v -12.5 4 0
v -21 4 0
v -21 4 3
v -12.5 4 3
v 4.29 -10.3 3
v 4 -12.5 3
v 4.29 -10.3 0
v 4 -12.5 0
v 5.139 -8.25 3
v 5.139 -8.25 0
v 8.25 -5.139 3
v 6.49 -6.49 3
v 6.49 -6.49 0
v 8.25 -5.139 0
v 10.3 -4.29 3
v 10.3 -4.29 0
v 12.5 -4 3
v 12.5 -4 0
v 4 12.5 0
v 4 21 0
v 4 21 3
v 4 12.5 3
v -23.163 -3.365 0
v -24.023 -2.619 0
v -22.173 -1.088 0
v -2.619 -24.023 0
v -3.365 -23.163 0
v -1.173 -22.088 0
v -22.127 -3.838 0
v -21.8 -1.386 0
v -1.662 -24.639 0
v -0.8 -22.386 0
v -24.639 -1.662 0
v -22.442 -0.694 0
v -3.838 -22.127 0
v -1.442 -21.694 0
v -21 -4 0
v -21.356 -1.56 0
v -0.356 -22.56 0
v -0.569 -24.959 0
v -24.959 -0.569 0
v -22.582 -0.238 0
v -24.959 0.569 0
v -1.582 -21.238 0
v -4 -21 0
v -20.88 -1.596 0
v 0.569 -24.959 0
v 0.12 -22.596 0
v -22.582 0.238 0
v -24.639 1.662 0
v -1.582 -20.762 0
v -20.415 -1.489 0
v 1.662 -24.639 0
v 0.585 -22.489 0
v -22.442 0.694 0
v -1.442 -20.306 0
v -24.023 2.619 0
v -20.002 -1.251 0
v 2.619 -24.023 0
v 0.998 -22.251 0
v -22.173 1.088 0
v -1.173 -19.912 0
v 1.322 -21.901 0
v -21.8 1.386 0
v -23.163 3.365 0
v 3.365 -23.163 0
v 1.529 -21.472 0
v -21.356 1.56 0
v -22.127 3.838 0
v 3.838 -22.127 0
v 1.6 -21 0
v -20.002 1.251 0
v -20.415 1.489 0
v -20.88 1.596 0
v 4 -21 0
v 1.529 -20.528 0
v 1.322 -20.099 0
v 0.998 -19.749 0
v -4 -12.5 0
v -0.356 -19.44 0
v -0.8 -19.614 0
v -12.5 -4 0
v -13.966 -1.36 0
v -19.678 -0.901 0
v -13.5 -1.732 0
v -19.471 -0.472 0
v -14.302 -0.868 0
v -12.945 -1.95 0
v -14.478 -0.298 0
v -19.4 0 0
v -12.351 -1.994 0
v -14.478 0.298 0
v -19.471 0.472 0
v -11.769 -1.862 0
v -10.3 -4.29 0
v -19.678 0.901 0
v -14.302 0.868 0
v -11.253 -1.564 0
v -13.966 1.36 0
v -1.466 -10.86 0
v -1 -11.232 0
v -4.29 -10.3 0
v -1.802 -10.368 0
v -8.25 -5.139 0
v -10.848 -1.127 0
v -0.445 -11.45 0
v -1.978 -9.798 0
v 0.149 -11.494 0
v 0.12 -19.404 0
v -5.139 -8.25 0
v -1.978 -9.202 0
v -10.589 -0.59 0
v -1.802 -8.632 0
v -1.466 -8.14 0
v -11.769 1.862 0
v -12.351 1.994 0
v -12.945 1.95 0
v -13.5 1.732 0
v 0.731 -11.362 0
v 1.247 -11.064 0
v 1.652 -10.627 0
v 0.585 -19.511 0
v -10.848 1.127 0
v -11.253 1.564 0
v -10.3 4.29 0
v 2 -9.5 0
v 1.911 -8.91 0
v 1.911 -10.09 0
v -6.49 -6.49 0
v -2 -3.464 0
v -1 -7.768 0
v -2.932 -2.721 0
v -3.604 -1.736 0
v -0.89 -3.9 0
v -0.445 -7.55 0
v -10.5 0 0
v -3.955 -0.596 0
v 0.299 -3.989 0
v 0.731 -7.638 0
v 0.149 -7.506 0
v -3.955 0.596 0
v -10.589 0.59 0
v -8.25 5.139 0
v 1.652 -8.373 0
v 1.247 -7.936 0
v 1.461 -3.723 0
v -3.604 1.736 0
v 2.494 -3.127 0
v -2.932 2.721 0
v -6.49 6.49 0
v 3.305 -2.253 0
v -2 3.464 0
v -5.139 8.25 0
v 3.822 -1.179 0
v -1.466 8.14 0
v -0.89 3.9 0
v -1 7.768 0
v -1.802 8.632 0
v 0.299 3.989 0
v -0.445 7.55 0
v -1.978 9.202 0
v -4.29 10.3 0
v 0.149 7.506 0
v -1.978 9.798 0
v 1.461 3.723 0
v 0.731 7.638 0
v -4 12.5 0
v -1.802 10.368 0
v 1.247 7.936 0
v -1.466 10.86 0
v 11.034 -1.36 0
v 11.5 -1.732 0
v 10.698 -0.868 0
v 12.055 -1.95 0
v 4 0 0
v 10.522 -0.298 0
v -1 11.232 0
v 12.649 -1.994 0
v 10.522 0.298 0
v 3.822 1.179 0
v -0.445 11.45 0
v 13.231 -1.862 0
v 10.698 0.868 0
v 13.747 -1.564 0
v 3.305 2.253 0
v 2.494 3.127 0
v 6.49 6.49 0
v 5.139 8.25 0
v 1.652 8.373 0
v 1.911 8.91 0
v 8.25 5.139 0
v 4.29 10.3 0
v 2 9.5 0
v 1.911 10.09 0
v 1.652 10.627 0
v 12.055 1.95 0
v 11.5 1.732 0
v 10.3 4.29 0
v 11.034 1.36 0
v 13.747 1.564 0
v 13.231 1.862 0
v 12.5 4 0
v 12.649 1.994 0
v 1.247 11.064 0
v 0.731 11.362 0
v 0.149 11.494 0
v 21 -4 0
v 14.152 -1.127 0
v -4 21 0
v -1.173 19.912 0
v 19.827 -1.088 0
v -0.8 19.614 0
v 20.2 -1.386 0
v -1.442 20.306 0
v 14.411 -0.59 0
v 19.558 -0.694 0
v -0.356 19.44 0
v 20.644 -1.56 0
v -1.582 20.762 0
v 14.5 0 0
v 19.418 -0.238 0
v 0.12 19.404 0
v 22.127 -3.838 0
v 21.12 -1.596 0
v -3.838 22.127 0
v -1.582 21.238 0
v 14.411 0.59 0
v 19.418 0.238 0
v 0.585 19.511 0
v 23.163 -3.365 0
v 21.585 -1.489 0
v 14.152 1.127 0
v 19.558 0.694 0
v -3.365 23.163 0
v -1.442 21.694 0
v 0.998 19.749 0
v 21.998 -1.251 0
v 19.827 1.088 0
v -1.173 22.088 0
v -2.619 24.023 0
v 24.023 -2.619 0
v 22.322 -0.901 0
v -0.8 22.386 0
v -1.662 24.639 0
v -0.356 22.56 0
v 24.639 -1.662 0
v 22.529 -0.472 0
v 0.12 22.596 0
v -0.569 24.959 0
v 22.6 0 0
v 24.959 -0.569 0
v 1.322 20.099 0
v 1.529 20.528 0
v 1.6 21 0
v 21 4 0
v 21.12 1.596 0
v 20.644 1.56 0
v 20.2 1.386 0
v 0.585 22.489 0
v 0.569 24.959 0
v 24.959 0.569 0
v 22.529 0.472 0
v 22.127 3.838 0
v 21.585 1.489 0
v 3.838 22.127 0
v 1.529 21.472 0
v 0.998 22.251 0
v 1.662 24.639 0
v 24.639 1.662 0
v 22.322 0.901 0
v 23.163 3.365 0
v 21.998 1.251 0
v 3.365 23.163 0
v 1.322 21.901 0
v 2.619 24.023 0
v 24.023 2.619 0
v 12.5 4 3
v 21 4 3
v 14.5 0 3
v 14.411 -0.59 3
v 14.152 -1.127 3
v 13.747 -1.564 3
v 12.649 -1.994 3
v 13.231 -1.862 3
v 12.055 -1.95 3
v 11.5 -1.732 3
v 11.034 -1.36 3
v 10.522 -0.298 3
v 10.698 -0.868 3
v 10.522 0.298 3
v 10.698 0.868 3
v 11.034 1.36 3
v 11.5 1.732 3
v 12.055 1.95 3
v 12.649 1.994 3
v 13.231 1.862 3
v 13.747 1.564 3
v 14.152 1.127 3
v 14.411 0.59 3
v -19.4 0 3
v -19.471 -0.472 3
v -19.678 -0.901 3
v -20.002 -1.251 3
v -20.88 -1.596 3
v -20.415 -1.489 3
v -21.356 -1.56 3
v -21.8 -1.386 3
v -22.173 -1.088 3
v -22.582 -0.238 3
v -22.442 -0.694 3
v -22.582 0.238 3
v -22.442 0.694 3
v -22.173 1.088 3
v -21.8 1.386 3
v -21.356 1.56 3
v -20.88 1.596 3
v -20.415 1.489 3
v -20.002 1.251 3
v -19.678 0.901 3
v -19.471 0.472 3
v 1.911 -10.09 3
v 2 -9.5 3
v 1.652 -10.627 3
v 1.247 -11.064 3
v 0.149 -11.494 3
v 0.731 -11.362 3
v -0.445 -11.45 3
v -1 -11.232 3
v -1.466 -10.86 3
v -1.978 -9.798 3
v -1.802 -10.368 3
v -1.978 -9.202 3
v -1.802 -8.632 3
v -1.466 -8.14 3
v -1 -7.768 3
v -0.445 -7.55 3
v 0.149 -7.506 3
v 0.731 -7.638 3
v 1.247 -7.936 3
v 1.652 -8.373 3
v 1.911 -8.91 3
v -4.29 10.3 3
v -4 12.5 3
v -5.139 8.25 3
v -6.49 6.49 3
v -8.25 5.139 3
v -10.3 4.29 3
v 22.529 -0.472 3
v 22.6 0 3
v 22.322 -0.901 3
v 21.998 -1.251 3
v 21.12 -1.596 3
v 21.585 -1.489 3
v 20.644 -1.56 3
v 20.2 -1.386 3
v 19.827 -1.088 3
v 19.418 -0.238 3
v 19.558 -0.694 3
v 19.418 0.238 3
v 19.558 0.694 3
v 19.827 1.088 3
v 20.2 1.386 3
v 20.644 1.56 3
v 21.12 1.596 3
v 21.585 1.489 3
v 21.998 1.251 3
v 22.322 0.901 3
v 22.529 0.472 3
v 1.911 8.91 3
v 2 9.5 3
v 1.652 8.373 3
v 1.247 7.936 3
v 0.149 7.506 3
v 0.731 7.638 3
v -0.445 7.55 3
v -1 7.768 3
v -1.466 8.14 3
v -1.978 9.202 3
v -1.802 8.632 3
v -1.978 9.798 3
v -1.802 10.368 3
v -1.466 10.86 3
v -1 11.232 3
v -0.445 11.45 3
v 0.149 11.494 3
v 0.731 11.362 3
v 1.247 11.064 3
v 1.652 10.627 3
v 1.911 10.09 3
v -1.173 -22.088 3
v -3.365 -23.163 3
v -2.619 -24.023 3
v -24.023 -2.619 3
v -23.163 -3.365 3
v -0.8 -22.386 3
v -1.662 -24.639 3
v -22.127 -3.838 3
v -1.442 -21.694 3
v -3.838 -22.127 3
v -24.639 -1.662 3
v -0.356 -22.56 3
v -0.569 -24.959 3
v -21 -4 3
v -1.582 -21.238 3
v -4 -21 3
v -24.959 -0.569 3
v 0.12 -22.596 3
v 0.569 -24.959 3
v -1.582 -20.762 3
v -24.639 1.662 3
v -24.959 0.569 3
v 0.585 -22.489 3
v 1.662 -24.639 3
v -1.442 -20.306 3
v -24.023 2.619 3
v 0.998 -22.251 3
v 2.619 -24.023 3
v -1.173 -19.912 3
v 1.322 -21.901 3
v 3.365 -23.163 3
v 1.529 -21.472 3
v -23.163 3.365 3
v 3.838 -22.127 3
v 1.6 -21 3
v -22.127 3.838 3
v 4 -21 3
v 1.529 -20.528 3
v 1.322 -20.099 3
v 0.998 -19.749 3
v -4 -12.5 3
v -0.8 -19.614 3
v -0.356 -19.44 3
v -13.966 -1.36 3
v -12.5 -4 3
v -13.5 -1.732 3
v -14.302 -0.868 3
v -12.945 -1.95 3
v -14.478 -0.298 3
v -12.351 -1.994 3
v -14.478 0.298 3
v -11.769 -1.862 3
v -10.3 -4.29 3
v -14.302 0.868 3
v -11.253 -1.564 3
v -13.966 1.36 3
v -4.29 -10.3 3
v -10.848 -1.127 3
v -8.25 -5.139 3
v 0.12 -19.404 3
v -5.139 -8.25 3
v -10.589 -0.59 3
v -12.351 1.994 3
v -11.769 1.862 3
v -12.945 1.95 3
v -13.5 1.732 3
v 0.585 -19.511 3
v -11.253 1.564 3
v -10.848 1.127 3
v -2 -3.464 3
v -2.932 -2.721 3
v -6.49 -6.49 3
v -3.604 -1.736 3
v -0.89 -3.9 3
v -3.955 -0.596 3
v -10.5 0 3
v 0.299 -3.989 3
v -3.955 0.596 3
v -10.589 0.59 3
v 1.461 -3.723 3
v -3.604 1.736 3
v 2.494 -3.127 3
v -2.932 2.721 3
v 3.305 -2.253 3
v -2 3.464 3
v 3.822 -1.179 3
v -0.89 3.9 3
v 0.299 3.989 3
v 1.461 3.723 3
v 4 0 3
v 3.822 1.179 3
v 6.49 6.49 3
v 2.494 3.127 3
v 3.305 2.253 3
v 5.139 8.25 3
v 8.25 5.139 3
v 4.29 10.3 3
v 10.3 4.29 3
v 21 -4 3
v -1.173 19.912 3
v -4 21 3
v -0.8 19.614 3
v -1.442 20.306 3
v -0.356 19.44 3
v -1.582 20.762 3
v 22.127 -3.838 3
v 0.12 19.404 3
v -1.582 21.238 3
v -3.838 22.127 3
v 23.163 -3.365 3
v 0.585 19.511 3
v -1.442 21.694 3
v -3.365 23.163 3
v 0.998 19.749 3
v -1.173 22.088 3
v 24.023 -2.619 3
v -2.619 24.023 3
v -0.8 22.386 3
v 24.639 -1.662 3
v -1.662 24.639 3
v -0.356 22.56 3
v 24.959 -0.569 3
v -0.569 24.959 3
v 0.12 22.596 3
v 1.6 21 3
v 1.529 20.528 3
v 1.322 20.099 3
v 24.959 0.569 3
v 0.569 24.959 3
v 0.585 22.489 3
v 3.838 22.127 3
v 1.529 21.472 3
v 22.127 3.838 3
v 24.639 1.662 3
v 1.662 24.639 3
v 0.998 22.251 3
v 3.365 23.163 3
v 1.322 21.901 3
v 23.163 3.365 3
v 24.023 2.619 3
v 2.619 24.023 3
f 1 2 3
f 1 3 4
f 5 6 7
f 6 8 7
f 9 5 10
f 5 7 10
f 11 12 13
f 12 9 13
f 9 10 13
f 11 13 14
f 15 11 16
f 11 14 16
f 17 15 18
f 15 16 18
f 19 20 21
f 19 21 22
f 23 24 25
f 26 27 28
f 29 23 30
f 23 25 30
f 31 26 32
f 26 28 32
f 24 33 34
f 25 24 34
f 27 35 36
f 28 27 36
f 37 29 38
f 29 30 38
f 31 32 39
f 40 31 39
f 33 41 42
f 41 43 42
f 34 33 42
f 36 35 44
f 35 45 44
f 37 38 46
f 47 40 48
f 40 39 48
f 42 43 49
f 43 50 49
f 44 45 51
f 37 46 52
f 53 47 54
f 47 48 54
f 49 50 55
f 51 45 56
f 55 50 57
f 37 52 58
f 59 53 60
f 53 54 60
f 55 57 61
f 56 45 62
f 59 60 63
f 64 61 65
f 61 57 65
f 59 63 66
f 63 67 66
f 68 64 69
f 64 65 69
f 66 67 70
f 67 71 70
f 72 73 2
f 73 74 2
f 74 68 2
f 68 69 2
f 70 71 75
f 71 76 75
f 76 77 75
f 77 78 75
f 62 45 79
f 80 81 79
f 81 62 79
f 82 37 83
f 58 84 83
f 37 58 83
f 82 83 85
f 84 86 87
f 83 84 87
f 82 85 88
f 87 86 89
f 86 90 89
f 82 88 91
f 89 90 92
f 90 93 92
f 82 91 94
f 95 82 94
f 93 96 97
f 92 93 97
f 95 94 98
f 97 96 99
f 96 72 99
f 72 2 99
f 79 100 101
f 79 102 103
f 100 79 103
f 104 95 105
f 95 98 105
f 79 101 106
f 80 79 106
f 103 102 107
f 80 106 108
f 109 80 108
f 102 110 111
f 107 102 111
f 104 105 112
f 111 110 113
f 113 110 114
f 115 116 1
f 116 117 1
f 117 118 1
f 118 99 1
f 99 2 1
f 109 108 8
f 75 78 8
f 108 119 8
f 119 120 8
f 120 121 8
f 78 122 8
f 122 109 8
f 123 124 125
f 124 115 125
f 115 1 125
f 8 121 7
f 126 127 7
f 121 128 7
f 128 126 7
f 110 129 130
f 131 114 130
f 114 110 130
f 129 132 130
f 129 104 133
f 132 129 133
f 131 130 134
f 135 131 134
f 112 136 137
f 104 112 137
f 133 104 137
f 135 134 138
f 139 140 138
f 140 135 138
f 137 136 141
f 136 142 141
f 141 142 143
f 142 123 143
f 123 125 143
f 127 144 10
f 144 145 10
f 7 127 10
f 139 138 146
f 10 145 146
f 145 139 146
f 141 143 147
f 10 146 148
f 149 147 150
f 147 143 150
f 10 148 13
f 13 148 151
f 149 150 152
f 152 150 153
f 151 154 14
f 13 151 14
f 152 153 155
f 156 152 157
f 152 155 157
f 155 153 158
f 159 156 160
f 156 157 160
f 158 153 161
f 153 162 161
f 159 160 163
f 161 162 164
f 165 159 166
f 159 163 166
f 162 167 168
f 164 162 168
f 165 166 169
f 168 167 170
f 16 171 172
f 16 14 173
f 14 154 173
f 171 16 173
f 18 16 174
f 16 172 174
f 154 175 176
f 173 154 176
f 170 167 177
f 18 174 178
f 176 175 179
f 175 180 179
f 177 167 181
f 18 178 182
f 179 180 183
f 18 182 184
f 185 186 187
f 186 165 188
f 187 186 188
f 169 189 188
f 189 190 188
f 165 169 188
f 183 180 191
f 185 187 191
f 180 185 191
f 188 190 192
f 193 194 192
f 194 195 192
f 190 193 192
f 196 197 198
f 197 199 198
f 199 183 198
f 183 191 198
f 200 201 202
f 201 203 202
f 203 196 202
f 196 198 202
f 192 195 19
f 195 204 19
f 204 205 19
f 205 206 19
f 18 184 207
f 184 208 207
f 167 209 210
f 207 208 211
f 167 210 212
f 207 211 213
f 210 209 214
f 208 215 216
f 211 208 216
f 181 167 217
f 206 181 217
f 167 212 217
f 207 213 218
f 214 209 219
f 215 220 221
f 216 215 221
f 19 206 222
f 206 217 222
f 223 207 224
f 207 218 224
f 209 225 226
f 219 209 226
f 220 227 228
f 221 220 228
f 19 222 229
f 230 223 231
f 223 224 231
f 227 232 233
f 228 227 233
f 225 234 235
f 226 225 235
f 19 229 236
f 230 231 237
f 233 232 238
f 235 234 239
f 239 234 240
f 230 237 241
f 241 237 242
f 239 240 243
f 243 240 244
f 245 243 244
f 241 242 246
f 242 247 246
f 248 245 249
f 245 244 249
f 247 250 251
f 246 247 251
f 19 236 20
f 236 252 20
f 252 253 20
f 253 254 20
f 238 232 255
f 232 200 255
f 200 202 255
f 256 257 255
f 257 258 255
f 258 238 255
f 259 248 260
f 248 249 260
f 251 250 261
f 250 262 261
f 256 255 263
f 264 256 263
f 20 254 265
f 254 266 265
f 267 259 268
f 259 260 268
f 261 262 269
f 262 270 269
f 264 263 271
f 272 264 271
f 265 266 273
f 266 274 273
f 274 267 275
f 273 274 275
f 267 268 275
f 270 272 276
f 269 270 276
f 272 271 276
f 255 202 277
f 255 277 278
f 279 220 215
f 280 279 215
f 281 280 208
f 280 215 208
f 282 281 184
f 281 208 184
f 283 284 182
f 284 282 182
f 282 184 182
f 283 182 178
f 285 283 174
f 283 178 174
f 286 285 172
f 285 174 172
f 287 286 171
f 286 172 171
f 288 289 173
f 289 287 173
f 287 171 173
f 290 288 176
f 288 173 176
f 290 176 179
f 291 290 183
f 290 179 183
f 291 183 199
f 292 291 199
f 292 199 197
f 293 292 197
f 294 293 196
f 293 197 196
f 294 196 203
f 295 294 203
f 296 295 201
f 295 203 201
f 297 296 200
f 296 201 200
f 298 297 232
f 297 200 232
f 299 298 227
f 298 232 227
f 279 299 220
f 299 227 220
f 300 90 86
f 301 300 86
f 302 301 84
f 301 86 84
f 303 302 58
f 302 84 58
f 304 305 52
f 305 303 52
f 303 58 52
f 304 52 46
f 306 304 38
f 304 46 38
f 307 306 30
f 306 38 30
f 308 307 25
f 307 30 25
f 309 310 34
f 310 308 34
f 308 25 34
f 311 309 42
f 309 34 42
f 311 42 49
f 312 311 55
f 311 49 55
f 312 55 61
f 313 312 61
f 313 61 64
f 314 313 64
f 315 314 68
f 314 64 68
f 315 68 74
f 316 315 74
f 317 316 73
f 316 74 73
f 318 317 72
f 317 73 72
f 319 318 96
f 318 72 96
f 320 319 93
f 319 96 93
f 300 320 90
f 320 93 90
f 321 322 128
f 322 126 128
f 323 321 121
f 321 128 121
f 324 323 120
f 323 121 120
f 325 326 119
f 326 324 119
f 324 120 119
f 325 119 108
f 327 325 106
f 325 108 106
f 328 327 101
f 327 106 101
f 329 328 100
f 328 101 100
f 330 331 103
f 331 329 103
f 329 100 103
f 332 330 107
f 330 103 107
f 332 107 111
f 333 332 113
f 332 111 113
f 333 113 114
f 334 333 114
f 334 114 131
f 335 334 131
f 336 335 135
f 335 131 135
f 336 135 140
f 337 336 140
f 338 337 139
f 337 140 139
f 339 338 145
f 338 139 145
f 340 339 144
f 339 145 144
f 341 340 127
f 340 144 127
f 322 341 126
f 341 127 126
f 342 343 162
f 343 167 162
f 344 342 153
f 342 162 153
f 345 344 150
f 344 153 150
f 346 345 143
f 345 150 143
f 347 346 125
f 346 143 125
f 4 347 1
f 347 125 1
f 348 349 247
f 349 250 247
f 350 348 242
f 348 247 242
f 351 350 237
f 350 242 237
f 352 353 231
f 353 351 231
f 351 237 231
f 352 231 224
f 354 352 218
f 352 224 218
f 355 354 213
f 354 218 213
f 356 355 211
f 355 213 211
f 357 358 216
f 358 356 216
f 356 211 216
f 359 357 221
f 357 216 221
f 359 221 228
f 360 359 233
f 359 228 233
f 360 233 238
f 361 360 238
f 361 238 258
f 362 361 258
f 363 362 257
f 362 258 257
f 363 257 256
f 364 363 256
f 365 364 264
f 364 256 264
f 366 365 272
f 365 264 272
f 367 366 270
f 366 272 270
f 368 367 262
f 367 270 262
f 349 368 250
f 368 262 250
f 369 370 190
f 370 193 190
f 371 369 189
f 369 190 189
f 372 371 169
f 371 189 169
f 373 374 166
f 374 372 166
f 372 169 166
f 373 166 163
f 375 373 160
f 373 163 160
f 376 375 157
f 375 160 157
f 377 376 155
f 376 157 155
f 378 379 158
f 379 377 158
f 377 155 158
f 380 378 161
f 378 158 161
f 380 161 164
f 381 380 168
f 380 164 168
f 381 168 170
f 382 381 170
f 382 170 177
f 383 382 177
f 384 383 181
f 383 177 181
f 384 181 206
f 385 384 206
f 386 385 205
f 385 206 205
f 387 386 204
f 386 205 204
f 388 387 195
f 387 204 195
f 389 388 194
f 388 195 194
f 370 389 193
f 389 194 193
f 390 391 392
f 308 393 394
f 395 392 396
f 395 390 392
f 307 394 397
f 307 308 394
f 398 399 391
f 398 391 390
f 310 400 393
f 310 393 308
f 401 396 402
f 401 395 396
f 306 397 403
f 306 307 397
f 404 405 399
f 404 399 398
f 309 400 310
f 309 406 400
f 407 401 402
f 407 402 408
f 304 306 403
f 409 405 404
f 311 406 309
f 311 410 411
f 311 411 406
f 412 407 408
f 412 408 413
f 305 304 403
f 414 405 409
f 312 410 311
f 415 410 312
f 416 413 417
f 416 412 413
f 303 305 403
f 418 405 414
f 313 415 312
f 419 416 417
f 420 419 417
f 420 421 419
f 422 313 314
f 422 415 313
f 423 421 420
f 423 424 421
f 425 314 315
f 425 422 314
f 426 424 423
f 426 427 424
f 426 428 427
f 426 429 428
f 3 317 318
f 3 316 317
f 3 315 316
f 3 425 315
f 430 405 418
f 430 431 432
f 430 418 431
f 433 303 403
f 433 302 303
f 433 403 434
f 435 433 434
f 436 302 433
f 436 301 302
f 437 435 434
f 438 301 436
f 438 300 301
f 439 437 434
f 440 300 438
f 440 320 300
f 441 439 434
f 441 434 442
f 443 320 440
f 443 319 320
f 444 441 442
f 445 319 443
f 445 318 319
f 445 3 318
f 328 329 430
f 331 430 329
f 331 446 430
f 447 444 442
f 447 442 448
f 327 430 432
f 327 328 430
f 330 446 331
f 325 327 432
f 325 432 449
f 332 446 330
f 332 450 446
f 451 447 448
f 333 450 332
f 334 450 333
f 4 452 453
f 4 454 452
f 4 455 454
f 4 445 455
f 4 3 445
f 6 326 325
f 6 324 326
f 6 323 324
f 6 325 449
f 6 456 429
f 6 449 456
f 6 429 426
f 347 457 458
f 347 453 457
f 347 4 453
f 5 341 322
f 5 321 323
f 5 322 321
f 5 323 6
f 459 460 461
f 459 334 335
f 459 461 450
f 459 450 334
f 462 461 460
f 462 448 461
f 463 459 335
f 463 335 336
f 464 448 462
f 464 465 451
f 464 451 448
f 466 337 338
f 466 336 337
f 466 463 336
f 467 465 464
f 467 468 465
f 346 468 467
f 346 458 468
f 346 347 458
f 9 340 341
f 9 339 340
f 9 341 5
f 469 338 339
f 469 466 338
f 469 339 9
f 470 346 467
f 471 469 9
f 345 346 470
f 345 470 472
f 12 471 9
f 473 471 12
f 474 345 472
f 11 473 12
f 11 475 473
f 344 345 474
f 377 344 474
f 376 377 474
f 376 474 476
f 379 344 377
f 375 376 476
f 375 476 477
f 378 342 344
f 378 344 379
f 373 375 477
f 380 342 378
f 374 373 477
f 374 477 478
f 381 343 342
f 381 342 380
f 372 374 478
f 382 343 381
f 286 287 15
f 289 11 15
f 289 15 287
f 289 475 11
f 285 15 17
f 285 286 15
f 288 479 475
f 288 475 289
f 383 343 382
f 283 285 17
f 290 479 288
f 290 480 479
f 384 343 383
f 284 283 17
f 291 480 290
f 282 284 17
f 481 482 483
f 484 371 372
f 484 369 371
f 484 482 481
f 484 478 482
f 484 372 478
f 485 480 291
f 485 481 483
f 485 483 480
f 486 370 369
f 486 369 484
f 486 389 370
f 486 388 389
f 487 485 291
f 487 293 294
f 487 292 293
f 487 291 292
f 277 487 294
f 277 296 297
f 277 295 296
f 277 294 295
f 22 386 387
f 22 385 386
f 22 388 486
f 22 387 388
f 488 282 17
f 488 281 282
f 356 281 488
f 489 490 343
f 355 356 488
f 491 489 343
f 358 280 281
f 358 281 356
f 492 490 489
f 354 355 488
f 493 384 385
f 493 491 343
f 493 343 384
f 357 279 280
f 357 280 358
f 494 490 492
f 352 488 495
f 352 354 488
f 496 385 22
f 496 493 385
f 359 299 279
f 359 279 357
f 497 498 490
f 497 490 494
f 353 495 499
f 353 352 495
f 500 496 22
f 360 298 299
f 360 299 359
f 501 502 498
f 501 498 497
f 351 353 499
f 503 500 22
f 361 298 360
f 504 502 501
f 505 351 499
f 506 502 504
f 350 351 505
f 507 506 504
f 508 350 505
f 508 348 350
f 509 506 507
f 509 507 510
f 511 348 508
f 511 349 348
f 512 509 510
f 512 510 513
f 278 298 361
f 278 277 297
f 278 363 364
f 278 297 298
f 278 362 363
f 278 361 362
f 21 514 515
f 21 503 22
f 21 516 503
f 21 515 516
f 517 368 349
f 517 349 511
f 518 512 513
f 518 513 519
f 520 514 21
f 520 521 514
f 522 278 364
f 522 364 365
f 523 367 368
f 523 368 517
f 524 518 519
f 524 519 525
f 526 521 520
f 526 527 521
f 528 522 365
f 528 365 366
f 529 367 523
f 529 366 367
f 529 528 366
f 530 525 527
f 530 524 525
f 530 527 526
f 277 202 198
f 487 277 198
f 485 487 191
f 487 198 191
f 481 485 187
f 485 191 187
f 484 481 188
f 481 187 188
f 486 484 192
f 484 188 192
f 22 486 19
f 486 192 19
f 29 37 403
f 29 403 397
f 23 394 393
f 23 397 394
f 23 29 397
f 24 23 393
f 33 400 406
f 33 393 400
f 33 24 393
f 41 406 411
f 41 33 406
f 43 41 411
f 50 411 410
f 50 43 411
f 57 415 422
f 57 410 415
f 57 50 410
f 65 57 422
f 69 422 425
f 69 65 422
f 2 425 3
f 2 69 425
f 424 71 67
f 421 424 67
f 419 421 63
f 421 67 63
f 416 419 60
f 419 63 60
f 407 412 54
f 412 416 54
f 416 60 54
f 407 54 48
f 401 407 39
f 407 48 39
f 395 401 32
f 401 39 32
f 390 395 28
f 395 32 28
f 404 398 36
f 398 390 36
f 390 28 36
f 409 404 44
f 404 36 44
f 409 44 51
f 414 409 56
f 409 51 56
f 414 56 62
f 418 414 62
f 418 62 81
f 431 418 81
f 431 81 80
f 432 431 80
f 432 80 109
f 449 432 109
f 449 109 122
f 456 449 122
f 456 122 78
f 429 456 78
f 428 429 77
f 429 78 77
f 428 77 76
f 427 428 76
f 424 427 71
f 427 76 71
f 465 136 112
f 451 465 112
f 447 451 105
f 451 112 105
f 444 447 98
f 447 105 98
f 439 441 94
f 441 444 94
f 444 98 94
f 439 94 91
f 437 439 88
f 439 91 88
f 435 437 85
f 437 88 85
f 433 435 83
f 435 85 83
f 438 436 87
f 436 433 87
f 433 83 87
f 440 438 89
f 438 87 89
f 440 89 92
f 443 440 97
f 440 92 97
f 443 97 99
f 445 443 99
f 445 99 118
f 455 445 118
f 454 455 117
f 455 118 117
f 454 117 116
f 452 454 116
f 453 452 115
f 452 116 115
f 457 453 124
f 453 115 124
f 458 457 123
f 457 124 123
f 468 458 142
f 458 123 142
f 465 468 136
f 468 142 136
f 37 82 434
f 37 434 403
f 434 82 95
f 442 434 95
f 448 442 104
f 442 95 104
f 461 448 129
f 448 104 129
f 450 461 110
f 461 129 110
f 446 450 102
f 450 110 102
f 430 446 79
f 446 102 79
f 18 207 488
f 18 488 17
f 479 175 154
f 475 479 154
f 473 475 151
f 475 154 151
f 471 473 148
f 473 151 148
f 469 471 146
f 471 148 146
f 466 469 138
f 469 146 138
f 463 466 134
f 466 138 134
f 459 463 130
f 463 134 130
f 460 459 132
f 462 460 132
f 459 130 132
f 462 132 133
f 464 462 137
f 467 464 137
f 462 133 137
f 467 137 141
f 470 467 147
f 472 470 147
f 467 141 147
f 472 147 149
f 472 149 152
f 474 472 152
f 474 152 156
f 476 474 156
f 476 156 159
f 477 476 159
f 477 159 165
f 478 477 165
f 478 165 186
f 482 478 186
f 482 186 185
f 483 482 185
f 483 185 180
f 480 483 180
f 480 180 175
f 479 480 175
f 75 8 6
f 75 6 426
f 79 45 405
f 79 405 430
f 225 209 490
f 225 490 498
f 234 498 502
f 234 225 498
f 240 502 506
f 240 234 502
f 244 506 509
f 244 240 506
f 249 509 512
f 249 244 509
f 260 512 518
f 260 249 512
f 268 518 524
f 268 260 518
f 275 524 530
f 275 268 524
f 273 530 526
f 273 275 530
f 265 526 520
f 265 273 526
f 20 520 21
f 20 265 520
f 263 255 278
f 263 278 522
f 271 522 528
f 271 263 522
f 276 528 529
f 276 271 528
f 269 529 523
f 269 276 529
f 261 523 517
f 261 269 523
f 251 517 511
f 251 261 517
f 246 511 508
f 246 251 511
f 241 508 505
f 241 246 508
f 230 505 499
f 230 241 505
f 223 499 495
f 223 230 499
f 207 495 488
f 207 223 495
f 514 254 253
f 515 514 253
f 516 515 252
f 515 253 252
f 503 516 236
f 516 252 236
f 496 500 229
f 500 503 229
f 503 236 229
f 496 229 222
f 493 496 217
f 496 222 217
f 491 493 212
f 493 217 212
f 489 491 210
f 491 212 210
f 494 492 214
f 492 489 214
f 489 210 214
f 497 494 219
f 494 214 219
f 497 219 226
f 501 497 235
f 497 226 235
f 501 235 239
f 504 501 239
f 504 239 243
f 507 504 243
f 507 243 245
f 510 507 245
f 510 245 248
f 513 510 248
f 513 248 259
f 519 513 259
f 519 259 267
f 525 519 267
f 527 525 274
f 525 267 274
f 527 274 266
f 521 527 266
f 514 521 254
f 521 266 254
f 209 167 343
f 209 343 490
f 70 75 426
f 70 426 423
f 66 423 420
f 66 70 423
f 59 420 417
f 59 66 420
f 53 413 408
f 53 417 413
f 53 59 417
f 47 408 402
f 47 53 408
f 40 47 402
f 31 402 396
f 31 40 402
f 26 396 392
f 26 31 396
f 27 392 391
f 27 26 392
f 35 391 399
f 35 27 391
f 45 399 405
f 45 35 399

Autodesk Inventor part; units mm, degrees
ref_plane "YZ Plane" through (0, 0, 0) normal (1, 0, 0) x (0, 1, 0)
ref_plane "XZ Plane" through (0, 0, 0) normal (0, 1, 0) x (-1, 0, 0)
ref_plane "XY Plane" through (0, 0, 0) normal (0, 0, 1) x (1, 0, 0)
sketch "Sketch1" plane through (0, 0, 0) normal (0, 0, 1) x (1, 0, 0)
  line L0 (-4, 25) -> (4, 25)
  line L1 (4, 25) -> (4, -25)
  line L2 (4, -25) -> (-4, -25)
  line L3 (-4, -25) -> (-4, 25)
  circle A0 centre (12.5, 0) radius 2
  circle A1 centre (-12.5, 0) radius 2
  circle A2 centre (21, 0) radius 1.6
  circle A3 centre (0, 21) radius 1.6
  circle A4 centre (-21, 0) radius 1.6
  circle A5 centre (0, -21) radius 1.6
  line L4 (-25, -4) -> (-25, 4)
  line L5 (-25, 4) -> (25, 4)
  line L6 (25, -4) -> (-25, -4)
  line L7 (25, 4) -> (25, -4)
  circle A6 centre (0, 21) radius 4
  circle A7 centre (21, 0) radius 4
  circle A8 centre (-21, 0) radius 4
  circle A9 centre (0, -21) radius 4
  circle A10 centre (12.5, 12.5) radius 8.5
  circle A11 centre (-12.5, 12.5) radius 8.5
  circle A12 centre (-12.5, -12.5) radius 8.5
  circle A13 centre (12.5, -12.5) radius 8.5
  circle A14 centre (0, 0) radius 4
  circle A15 centre (0, 9.5) radius 2
  circle A16 centre (0, -9.5) radius 2
  point P0 (4, 0)
  point P1 (0, 25)
  point P2 (-25, 0)
  point P3 (0, 4)
  point P4 (12.5, 4)
  point P5 (4, 12.5)
  point P6 (4, 21)
  point P7 (-4, 21)
  point P8 (-4, 12.5)
  point P9 (-12.5, 4)
  point P10 (-21, 4)
  point P11 (-21, -4)
  point P12 (-12.5, -4)
  point P13 (-4, -12.5)
  point P14 (-4, -21)
  point P15 (4, -21)
  point P16 (4, -12.5)
  point P17 (12.5, -4)
  point P18 (21, -4)
  point P19 (21, 4)
  point P20 (4, 4)
  point P21 (4, -4)
  point P22 (-4, -4)
  point P23 (-4, 4)
  point P24 (0, 4)
  point P25 (0, -4)
  point P26 (-4, 0)
  dimension "d0" = 4
  dimension "d3" = 360
  dimension "d5" = 3.2
  dimension "d8" = 360
  dimension "d10" = 8
  dimension "d13" = 90
  dimension "d15" = 50
  dimension "d16" = 42
  dimension "d17" = 4
  dimension "d19" = 17
  dimension "d22" = 360
  dimension "d27" = 4
  dimension "d30" = 360
  dimension "d32" = 19
  dimension "d33" = 25
extrude "Extrusion1" add sketch "Sketch1" along normal blind 3 contours A6 | A6 L1 L5 L3 | L3 L5 A11 | A10 L5 L1 | L5 A14 L3 | L3 L6 A8 L5 | L5 A7 L6 L1 | L1 A14 L5 | A14 L6 L3 | A8 | L1 L6 A14 | A7 | L6 L1 A9 L3 | L3 A12 L6 | L6 A13 L1 | A9
properties part number "ACOPLE"
